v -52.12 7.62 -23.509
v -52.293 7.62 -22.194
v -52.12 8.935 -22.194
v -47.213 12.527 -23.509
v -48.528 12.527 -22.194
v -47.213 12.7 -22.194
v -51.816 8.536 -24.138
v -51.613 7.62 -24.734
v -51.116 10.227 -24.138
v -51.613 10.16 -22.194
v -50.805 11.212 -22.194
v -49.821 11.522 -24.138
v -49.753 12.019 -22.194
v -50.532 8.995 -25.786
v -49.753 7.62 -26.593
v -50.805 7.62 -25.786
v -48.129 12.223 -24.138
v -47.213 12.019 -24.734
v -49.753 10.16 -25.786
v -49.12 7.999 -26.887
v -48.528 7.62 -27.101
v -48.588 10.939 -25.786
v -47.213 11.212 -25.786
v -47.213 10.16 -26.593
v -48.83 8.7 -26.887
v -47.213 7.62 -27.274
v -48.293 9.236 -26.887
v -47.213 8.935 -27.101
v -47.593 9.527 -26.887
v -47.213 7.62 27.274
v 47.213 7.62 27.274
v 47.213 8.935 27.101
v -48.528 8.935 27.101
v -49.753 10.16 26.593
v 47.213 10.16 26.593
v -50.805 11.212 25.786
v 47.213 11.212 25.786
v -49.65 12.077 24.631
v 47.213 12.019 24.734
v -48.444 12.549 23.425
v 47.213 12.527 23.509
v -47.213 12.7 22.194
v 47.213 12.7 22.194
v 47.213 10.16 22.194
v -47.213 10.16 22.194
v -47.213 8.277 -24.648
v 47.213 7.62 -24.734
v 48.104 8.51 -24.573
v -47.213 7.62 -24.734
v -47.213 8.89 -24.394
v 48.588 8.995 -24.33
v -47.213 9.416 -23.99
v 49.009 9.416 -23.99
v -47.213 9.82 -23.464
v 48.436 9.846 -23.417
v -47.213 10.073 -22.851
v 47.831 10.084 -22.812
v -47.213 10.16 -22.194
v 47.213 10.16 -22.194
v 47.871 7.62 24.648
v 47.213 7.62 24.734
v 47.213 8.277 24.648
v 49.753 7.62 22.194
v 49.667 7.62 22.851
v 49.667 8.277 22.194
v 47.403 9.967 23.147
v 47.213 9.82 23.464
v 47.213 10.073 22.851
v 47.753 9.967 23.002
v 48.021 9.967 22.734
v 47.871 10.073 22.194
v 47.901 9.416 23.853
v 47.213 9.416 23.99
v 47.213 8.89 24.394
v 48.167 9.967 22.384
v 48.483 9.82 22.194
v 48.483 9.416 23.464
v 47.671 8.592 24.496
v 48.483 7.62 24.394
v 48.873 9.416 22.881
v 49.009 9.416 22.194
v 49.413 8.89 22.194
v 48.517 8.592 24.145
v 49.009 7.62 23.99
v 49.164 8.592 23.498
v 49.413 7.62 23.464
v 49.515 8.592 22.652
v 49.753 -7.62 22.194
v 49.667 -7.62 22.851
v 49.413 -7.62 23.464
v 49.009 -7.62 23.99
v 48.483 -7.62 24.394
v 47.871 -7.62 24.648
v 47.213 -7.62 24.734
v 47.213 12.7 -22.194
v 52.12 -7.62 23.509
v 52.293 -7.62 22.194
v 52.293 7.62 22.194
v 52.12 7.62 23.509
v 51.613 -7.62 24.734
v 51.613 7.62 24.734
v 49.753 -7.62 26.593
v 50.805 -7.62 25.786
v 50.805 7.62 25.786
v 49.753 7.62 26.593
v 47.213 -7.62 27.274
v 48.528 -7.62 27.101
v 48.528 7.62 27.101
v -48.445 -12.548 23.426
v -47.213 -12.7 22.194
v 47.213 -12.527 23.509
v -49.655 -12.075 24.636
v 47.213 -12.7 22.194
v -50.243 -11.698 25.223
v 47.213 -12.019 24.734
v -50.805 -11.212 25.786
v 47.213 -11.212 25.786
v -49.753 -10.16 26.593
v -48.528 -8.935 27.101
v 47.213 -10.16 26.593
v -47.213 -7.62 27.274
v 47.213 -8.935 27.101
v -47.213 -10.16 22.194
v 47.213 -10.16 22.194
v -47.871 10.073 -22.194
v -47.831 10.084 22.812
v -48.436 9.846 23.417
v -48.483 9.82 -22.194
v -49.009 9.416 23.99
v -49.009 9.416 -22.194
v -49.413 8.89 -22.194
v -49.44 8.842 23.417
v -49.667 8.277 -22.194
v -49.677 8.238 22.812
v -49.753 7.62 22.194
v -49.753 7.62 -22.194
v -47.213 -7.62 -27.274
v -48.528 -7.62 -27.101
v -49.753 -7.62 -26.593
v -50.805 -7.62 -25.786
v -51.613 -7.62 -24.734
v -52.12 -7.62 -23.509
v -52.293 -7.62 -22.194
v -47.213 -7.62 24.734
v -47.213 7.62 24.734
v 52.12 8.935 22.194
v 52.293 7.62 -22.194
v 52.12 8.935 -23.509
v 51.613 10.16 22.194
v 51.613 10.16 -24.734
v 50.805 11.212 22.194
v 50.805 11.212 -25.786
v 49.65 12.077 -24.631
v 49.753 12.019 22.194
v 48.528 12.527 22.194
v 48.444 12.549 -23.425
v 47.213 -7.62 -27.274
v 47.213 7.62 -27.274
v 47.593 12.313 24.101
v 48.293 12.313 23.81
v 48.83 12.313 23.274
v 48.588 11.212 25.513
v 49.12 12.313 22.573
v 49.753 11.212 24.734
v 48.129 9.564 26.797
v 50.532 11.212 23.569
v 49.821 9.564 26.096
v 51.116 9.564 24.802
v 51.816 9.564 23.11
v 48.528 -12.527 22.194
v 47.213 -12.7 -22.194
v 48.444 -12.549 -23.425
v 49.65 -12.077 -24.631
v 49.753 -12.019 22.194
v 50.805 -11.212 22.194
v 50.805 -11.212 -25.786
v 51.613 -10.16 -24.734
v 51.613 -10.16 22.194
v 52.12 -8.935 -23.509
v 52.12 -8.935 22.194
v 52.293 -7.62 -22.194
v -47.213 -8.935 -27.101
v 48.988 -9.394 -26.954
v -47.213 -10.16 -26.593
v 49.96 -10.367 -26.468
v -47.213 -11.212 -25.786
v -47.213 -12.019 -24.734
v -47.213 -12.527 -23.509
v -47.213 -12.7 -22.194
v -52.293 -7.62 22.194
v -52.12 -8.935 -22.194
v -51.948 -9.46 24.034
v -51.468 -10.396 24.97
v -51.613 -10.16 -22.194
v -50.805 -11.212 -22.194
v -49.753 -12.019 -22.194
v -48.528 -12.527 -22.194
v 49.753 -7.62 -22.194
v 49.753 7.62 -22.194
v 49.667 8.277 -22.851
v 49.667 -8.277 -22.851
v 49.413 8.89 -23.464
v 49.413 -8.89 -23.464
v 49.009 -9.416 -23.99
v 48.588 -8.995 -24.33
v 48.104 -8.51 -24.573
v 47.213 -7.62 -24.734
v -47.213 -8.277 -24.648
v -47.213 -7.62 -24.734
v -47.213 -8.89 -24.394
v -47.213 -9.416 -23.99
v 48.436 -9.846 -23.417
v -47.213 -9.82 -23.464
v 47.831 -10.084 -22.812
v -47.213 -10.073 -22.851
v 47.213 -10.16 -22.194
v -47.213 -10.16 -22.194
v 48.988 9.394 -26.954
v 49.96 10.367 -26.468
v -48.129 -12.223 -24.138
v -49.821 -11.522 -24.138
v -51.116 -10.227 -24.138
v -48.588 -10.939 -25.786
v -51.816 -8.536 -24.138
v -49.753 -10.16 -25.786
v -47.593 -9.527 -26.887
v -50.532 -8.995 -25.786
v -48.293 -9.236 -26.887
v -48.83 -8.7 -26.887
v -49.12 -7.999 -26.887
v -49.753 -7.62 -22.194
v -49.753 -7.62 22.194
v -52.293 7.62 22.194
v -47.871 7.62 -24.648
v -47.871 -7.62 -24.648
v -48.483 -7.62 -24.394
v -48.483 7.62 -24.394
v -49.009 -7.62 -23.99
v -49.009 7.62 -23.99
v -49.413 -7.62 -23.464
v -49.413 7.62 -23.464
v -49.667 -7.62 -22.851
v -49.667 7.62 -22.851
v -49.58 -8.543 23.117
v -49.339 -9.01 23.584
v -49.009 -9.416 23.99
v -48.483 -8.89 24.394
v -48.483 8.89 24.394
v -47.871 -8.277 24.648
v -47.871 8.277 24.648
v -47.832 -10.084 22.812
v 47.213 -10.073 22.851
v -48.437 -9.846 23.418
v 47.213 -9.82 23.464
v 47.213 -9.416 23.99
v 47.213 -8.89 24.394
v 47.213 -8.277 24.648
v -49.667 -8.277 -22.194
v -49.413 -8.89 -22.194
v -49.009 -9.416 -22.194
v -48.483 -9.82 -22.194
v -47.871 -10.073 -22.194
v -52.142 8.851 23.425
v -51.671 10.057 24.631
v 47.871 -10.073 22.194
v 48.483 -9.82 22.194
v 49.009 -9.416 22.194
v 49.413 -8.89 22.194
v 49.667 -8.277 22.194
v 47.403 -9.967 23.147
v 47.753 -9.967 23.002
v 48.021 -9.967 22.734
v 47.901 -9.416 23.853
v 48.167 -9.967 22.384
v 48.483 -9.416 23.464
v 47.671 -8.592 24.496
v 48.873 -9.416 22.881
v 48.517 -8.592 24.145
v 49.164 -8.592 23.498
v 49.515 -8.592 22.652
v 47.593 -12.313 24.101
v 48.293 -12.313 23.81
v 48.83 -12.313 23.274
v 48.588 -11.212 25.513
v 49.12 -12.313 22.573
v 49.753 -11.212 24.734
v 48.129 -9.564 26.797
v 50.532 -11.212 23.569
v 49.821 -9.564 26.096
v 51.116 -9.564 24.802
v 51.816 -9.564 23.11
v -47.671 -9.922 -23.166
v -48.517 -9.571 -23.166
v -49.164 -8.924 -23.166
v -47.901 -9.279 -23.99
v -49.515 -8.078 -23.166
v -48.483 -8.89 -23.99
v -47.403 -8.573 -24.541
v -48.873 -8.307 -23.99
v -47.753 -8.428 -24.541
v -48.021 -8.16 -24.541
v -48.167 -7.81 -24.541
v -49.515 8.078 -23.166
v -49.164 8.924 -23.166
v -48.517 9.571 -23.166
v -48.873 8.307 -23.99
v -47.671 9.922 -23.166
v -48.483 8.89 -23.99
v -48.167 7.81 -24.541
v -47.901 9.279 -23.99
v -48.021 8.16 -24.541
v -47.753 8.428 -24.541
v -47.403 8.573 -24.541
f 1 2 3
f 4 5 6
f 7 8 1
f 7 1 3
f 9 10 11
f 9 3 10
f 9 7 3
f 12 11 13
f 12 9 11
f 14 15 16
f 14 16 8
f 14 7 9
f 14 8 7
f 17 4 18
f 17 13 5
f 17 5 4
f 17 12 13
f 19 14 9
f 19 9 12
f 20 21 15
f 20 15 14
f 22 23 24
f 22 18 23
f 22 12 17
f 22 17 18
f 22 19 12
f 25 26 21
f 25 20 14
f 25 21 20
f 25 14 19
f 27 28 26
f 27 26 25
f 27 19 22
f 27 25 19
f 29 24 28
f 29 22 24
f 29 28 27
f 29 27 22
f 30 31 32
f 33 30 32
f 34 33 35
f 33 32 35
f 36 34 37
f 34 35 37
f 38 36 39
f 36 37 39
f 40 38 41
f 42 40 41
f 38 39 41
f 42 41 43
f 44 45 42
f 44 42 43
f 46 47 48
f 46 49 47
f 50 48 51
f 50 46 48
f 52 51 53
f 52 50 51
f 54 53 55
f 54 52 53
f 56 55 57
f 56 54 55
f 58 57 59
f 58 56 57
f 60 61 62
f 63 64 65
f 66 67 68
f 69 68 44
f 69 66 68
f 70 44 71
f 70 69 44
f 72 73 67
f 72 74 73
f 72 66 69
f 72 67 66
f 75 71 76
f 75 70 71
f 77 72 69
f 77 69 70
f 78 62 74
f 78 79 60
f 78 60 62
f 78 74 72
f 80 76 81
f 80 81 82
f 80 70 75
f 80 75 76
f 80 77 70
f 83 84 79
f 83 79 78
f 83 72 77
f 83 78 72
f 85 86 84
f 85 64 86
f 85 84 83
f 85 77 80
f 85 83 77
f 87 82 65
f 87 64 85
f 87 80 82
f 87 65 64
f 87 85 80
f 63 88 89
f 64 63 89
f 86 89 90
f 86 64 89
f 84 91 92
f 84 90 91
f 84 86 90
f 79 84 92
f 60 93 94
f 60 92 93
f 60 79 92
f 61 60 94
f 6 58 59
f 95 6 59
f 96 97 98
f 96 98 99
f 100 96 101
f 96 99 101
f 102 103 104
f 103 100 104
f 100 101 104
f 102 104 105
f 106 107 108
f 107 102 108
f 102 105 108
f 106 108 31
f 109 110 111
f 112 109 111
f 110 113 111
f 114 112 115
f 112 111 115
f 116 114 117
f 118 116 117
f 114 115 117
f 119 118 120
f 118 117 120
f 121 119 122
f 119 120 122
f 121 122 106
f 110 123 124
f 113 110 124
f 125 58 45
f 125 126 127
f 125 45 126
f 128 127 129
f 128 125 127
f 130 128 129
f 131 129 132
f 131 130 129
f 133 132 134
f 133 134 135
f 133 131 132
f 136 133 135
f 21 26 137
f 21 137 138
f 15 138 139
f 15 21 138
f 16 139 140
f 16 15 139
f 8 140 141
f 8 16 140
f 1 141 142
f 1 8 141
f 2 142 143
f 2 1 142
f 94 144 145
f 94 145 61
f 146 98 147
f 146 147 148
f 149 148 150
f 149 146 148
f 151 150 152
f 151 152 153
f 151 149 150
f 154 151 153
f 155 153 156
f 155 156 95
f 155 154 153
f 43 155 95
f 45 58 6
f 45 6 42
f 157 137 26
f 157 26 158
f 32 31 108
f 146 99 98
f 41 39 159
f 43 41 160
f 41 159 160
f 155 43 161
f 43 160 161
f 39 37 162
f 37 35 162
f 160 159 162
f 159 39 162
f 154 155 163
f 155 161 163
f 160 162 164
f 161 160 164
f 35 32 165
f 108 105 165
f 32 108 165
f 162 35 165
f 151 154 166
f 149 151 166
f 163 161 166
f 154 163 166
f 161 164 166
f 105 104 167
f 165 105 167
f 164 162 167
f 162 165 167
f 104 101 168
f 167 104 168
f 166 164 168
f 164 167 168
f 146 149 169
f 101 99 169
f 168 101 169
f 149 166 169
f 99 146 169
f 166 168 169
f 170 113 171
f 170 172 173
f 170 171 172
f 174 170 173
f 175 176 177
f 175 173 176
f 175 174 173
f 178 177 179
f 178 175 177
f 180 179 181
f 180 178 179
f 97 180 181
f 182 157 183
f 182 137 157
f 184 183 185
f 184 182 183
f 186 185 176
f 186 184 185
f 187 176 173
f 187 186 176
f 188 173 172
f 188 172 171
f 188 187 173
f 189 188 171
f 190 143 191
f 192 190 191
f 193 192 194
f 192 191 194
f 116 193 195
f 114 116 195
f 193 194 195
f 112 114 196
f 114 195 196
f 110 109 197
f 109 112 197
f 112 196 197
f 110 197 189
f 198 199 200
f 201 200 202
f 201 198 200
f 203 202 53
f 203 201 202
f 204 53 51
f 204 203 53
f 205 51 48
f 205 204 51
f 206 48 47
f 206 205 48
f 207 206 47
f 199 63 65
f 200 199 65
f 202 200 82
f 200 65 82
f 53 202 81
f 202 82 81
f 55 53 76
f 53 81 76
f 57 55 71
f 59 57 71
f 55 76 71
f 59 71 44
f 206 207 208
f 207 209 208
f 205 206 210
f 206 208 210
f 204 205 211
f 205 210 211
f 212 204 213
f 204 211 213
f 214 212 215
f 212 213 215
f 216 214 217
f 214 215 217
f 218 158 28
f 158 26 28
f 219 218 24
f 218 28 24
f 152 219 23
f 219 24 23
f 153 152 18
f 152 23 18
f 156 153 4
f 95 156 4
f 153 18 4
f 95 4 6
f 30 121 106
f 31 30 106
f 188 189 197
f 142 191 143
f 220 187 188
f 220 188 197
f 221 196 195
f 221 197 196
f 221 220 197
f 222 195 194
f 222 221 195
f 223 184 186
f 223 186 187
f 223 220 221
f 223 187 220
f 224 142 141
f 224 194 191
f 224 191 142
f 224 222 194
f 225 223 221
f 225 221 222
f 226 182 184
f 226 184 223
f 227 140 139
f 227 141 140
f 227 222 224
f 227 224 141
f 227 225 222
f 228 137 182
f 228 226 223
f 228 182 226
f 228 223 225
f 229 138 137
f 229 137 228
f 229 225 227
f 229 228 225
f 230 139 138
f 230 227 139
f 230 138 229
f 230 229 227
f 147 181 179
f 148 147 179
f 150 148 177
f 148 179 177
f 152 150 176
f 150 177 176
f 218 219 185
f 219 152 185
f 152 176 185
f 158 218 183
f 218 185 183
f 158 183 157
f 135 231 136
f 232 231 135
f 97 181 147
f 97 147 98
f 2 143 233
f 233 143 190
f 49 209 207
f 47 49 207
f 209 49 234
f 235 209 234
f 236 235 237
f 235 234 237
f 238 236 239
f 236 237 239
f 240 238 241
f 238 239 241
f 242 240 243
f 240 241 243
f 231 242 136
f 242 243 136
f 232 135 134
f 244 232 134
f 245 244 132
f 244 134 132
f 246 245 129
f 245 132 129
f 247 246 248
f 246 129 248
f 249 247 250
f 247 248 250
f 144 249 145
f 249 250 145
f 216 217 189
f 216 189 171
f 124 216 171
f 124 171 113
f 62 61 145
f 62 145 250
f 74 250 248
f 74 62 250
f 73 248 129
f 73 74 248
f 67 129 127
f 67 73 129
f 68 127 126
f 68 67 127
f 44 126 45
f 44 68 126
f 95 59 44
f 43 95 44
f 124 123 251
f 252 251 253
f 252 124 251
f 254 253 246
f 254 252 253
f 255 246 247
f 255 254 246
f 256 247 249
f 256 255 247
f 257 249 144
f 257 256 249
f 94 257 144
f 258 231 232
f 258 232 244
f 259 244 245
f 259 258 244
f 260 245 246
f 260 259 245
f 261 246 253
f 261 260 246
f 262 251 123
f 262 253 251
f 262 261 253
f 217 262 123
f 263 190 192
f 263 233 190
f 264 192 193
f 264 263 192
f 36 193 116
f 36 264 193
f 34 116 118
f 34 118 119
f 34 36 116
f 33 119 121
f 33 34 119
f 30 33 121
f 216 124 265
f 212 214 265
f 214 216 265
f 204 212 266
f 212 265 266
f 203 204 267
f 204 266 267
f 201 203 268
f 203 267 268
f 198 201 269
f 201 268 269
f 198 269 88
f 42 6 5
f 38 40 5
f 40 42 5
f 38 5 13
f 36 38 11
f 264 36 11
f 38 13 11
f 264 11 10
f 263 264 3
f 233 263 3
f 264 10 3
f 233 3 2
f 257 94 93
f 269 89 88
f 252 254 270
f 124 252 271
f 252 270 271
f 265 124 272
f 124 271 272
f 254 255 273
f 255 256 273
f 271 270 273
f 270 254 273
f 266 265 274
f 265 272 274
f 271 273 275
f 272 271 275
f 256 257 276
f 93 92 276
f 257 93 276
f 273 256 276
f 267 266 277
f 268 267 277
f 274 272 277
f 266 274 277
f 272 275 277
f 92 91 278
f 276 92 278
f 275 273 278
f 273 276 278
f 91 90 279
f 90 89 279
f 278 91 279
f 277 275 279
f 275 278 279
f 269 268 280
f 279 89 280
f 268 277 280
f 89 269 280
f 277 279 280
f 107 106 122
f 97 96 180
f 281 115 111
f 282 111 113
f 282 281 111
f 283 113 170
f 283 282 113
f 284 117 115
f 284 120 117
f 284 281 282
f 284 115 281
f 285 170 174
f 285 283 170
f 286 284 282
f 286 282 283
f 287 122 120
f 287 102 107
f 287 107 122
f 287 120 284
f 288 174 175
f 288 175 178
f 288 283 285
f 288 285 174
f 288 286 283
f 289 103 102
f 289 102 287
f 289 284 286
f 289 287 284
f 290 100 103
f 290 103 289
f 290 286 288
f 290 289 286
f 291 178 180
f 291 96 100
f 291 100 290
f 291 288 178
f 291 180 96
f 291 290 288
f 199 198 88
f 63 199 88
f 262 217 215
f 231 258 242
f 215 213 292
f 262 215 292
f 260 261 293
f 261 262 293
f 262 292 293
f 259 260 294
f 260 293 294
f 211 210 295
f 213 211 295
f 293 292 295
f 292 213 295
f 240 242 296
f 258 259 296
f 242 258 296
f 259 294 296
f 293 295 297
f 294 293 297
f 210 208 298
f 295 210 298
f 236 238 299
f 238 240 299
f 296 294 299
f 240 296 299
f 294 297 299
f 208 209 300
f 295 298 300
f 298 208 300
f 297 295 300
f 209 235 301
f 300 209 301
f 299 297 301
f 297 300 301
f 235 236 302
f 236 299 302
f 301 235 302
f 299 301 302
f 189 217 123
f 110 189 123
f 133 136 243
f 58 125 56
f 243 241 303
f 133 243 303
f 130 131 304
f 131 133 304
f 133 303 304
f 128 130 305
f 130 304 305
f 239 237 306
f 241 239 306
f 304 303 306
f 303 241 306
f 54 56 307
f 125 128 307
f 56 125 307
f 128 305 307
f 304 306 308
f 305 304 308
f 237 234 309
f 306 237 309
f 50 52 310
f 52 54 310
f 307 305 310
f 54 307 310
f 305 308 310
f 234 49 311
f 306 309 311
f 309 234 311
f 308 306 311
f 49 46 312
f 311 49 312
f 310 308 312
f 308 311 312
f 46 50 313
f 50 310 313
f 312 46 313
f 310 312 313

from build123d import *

# Parameters (mm, degrees)
F0_W         = 104.5865043998
F0_H         = 54.5481517911
F1_DEPTH     = 12.7
F2_R         = 5.08
F3_T1_DEPTH  = 57.0881517911
F3_T3_DEPTH  = 15.24
F3_T5_DEPTH  = 107.1265043998
F3_S9_W      = 5.1816
F3_S9_H      = 5.1816
F3_T10_DEPTH = 5.1816
F3_S15_W     = 5.1816
F3_S15_H     = 5.1816
F3_T16_DEPTH = 5.1816
F4_T         = -2.54


# Not quite as in the source:
# - a fillet or chamfer that OpenCascade refuses, or shapes differently, is made with other operations: its cross-section is extruded or revolved along the edge and cut away or added
# - a shell that OpenCascade refuses in one call is made with other operations: the cavity is built on its own and cut out


with BuildPart() as f1:
    # F0 (on Front) → F1 (new body, symmetric)
    with BuildSketch(Plane.XZ):
        Rectangle(F0_W, F0_H)
    extrude(amount=F1_DEPTH, both=True)

    # F2
    f2_edges = [f1.edges().sort_by_distance(p)[0] for p in [
        (52.293252, 0, 27.274076),
        (0, 12.7, 27.274076),
        (-52.293252, 0, 27.274076),
        (0, -12.7, 27.274076),
        (52.293252, 0, -27.274076),
        (52.293252, 12.7, 0),
        (52.293252, -12.7, 0),
    ]]
    fillet(f2_edges, radius=F2_R)

    # F3: fillet of radius 5.08 on 7 edges, made by hand

    # F3_s2 → F3_t1 (cut)
    with BuildSketch(Plane.XY.offset(-22.1940758955)):
        with BuildLine():
            ThreePointArc((-47.2132521999, 12.7), (-50.8053546483, 11.2121024484), (-52.2932521999, 7.62))
            Line((-52.2932521999, 7.62), (-52.2932521999, 12.7))
            Line((-52.2932521999, 12.7), (-47.2132521999, 12.7))
        make_face()
        with BuildLine():
            ThreePointArc((-52.2932521999, -7.62), (-50.8053546483, -11.2121024484), (-47.2132521999, -12.7))
            Line((-47.2132521999, -12.7), (-52.2932521999, -12.7))
            Line((-52.2932521999, -12.7), (-52.2932521999, -7.62))
        make_face()
    extrude(amount=F3_T1_DEPTH, mode=Mode.SUBTRACT)

    # F3_s4 → F3_t3 (cut)
    with BuildSketch(Plane.XZ.offset(-7.62)):
        with BuildLine():
            ThreePointArc((-47.2132521999, -27.2740758955), (-50.8053546483, -25.786178344), (-52.2932521999, -22.1940758955))
            Line((-52.2932521999, -22.1940758955), (-52.2932521999, -27.2740758955))
            Line((-52.2932521999, -27.2740758955), (-47.2132521999, -27.2740758955))
        make_face()
    extrude(amount=F3_T3_DEPTH, mode=Mode.SUBTRACT)

    # F3_s6 → F3_t5 (cut)
    with BuildSketch(Plane.YZ.offset(-47.2132521999)):
        with BuildLine():
            ThreePointArc((7.62, -27.2740758955), (11.2121024484, -25.786178344), (12.7, -22.1940758955))
            Line((12.7, -22.1940758955), (12.7, -27.2740758955))
            Line((12.7, -27.2740758955), (7.62, -27.2740758955))
        make_face()
        with BuildLine():
            ThreePointArc((-7.62, -27.2740758955), (-11.2121024484, -25.786178344), (-12.7, -22.1940758955))
            Line((-12.7, -22.1940758955), (-12.7, -27.2740758955))
            Line((-12.7, -27.2740758955), (-7.62, -27.2740758955))
        make_face()
    extrude(amount=F3_T5_DEPTH, mode=Mode.SUBTRACT)


with BuildPart() as f3_tool8:
    # F3_s9 → F3_t10 (new body)
    with BuildSketch(Plane.XY.offset(-22.1940758955)):
        with Locations((-49.8040521999, 10.2108)):
            Rectangle(F3_S9_W, F3_S9_H)
    extrude(amount=-F3_T10_DEPTH)

    # F3_s11 → F3_t12 (revolve, cut)
    with BuildSketch(Plane(origin=(-47.2132521999, 7.62, -22.1940758955), x_dir=(0.7071067812, -0.7071067812, 0), z_dir=(0.7071067812, 0.7071067812, 0))):
        with BuildLine():
            ThreePointArc((0, -5.08), (5.08, 0), (0, 5.08))
            Line((0, 5.08), (0, -5.08))
        make_face()
    revolve(axis=Axis((-47.2132521999, 7.62, -22.1940758955), (0, 0, -1)), mode=Mode.SUBTRACT)


with BuildPart() as f1_1:
    add(f1.part)

    # F3_t7: cut F3_tool8
    add(f3_tool8.part, mode=Mode.SUBTRACT)


with BuildPart() as f3_tool14:
    # F3_s15 → F3_t16 (new body)
    with BuildSketch(Plane.XY.offset(-22.1940758955)):
        with Locations((-49.8040521999, -10.2108)):
            Rectangle(F3_S15_W, F3_S15_H)
    extrude(amount=-F3_T16_DEPTH)

    # F3_s17 → F3_t18 (revolve, cut)
    with BuildSketch(Plane(origin=(-47.2132521999, -7.62, -22.1940758955), x_dir=(0.7071067812, 0.7071067812, 0), z_dir=(-0.7071067812, 0.7071067812, 0))):
        with BuildLine():
            ThreePointArc((0, -5.08), (5.08, 0), (0, 5.08))
            Line((0, 5.08), (0, -5.08))
        make_face()
    revolve(axis=Axis((-47.2132521999, -7.62, -22.1940758955), (0, 0, -1)), mode=Mode.SUBTRACT)


with BuildPart() as f1_2:
    add(f1_1.part)

    # F3_t13: cut F3_tool14
    add(f3_tool14.part, mode=Mode.SUBTRACT)

    # F4: a shell. OpenCascade refuses it in one call, so the cavity is built on its own and cut out:
    # the body offset inwards by the wall thickness, plus a prism from it out through each open face.
    f4_core = offset(f1_2.part, amount=F4_T, mode=Mode.PRIVATE)
    f4_exits = [f4_core.faces().sort_by_distance(p)[0] for p in [
        (0, -10.16, 0),
        (0, 10.16, 0),
    ]]
    add(f4_core, mode=Mode.SUBTRACT)
    extrude(f4_exits, amount=-F4_T, mode=Mode.SUBTRACT)


solid = f1_2.part
